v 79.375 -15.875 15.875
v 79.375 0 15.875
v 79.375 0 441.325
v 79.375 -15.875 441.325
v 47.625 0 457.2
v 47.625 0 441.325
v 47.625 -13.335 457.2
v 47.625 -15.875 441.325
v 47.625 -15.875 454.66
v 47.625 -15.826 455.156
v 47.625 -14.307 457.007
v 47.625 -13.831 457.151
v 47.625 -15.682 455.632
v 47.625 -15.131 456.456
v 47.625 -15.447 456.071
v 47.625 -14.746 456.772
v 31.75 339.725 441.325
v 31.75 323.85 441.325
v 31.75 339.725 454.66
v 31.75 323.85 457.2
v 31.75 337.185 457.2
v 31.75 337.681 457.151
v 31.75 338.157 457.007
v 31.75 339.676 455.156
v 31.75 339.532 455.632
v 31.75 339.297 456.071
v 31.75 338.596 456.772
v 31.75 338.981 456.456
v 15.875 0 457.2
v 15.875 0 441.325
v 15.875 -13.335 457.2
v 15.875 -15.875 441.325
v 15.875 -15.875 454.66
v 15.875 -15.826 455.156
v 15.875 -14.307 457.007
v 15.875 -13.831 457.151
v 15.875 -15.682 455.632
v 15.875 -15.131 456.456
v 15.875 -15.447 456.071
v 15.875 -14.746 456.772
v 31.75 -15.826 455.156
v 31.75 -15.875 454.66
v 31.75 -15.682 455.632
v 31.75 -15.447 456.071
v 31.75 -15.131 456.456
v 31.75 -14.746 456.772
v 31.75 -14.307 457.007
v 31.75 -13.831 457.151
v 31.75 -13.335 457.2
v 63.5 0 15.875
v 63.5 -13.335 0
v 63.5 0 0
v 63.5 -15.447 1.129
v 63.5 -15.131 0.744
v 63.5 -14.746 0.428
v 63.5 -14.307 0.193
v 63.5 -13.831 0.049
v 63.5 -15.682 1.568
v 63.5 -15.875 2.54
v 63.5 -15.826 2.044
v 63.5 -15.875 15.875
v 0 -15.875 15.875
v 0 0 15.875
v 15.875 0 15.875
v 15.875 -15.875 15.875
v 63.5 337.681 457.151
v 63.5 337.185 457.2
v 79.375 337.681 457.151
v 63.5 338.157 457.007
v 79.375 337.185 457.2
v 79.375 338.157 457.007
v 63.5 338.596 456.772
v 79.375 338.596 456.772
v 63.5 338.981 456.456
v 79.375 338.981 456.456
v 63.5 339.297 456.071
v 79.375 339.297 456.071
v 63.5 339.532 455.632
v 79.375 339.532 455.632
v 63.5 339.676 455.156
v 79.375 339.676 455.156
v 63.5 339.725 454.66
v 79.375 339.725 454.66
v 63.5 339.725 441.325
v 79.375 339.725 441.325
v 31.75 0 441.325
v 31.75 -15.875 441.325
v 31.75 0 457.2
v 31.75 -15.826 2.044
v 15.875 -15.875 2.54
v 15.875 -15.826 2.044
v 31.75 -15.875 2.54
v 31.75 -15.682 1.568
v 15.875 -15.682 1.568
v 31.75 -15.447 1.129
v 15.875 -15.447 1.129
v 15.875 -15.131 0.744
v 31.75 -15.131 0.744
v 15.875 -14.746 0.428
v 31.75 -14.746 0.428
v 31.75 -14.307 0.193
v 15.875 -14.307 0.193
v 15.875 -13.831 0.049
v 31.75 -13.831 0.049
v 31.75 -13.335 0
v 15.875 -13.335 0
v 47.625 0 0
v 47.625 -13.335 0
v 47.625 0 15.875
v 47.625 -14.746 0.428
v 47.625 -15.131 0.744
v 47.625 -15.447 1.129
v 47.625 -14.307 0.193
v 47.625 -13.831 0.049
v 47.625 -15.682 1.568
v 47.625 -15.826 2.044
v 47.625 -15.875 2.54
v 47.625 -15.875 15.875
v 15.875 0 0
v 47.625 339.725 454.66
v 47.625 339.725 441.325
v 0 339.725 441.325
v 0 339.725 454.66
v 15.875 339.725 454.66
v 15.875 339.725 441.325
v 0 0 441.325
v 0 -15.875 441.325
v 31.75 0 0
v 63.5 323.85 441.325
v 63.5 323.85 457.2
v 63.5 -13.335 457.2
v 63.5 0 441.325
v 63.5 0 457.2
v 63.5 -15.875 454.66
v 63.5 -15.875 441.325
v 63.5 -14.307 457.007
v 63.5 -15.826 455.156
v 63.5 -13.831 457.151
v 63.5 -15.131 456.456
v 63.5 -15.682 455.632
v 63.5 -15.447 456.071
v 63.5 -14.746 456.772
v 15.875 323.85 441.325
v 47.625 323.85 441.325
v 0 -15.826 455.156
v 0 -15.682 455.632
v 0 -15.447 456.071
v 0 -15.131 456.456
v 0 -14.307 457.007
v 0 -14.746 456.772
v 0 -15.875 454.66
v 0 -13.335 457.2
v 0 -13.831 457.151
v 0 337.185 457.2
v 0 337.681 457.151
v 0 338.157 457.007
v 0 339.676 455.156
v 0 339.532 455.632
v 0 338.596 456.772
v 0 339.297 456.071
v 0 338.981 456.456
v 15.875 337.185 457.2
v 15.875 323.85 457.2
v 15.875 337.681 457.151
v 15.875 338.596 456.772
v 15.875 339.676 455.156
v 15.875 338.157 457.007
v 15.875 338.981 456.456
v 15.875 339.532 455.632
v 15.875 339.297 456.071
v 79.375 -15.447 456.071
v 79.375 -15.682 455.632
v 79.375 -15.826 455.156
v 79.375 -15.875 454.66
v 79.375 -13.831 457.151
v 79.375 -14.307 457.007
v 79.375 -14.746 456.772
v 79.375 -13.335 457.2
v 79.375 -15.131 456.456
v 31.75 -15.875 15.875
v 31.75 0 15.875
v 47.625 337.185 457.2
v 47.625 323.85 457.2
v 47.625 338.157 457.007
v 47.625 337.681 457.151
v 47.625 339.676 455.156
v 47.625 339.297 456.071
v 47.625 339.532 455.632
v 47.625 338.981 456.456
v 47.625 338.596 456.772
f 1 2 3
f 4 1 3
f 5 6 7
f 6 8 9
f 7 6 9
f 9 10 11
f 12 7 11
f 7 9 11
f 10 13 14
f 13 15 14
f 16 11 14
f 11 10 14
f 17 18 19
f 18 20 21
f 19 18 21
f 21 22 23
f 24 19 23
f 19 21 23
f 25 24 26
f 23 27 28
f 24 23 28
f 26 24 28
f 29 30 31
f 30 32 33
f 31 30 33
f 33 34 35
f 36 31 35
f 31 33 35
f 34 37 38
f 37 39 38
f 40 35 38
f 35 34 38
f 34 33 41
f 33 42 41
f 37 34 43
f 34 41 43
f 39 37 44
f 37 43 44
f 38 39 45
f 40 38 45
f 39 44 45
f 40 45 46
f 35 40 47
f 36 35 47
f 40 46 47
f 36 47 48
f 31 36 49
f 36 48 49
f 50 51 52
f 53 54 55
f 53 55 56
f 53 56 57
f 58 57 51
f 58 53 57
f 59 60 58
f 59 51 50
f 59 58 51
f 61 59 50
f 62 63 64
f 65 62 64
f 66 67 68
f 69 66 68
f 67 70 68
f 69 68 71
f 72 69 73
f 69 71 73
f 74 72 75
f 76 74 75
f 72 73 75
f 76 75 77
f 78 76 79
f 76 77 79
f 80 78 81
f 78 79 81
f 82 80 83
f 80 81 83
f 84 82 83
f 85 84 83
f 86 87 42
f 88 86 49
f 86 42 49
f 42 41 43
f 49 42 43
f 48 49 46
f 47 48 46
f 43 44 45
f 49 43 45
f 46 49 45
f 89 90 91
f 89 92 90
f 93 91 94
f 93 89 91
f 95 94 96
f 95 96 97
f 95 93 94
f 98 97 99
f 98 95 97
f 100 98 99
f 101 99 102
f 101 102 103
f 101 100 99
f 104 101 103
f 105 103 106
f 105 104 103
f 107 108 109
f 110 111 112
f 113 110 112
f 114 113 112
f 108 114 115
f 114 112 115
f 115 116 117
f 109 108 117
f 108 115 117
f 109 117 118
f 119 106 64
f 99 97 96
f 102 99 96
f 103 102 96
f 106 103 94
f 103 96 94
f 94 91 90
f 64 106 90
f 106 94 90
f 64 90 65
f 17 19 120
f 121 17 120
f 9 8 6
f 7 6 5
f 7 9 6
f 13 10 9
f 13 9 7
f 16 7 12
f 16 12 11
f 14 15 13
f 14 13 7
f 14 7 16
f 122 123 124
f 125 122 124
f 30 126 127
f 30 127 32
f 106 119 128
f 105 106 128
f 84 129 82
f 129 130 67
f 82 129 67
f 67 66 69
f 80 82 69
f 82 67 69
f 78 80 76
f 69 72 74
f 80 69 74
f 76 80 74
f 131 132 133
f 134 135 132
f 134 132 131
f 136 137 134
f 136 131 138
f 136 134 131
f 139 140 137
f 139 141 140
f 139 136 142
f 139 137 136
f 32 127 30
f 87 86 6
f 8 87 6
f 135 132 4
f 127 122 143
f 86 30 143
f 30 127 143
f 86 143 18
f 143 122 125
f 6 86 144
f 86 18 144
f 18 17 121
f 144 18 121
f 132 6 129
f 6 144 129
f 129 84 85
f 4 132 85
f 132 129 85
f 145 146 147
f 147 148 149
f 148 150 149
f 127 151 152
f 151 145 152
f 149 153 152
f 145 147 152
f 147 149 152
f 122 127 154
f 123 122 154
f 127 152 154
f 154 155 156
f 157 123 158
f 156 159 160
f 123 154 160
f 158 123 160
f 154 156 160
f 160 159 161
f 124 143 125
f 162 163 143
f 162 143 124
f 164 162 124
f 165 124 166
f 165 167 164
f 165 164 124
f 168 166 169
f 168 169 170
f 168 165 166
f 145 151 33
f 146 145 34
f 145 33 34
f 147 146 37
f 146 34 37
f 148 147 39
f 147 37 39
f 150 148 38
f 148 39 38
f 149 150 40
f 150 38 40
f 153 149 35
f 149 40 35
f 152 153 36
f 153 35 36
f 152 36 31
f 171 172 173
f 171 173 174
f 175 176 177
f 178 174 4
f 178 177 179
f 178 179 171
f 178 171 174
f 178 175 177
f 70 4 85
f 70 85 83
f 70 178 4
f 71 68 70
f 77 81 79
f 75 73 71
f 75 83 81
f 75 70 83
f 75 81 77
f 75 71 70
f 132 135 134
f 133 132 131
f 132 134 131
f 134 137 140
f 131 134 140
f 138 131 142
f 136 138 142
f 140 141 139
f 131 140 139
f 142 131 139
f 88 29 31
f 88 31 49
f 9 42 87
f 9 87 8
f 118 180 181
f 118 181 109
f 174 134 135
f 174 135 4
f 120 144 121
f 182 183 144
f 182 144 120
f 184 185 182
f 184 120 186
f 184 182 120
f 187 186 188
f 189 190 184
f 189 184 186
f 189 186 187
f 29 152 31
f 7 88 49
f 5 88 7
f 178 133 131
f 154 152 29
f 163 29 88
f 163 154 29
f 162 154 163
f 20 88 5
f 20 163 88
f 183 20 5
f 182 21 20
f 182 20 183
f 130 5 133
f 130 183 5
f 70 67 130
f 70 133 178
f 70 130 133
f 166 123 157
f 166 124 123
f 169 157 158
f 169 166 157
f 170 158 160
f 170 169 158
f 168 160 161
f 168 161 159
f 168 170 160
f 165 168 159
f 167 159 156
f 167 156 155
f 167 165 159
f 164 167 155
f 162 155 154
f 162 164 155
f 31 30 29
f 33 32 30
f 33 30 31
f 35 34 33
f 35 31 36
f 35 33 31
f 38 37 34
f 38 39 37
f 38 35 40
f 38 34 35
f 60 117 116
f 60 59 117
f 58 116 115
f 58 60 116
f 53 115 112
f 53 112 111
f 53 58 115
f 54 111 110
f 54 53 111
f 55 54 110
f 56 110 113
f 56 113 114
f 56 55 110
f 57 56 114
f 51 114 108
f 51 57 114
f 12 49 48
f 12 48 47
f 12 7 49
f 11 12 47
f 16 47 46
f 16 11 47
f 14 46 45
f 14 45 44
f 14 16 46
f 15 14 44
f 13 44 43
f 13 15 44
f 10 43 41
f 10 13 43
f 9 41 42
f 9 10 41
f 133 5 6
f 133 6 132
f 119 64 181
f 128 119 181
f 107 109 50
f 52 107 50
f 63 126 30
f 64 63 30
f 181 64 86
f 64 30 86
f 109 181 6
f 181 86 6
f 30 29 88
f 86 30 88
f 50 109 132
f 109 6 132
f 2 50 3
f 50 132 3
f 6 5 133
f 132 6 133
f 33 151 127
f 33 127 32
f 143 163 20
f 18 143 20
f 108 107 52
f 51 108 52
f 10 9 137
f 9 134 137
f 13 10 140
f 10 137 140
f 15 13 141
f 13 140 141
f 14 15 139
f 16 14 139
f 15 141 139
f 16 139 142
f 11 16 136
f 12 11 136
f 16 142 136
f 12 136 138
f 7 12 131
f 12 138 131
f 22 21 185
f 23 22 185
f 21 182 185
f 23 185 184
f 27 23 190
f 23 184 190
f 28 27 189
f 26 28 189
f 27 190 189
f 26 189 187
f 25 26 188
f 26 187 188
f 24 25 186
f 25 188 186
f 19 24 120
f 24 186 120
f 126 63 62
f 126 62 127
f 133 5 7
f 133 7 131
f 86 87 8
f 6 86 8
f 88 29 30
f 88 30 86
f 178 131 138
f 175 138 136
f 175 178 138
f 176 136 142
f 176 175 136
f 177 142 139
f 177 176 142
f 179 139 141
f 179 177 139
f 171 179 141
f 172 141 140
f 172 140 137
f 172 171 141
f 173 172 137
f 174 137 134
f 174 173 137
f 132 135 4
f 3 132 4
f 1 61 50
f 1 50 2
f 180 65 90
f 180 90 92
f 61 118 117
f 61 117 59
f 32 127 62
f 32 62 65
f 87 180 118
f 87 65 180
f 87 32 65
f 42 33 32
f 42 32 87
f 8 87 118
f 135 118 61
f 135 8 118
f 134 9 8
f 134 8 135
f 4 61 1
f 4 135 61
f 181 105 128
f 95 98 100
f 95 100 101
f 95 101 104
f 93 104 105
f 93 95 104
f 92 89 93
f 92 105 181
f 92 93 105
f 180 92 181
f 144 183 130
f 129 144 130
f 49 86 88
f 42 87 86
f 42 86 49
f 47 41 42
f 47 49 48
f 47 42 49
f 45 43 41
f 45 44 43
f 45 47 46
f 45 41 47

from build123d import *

# Parameters (mm, degrees)
F0_W     = 79.375
F0_H     = 457.2
F1_DEPTH = 15.875
F2_W     = 15.875
F2_H     = 15.875
F3_DEPTH = 15.875
F4_W     = 79.375
F4_H     = 355.6
F5_DEPTH = 15.875
F8_W     = 15.875
F8_H     = 15.875
F9_DEPTH = 15.875
F10_R    = 2.54
F10_2_R  = 2.54


with BuildPart() as f1:
    # F0 (on Front) → F1 (new body)
    with BuildSketch(Plane.XZ):
        with Locations((39.6875, 228.6)):
            Rectangle(F0_W, F0_H)
    extrude(amount=F1_DEPTH)

    # F2 (on face) → F3 (cut, through all)
    with BuildSketch(Plane.XZ.offset(15.875)):
        with Locations((7.9375, 449.2625)):
            Rectangle(F2_W, F2_H)
        with Locations((7.9375, 7.9375)):
            Rectangle(F2_W, F2_H)
        with Locations((39.6875, 449.2625)):
            Rectangle(F2_W, F2_H)
        with Locations((39.6875, 7.9375)):
            Rectangle(F2_W, F2_H)
        with Locations((71.4375, 449.2625)):
            Rectangle(F2_W, F2_H)
        with Locations((71.4375, 7.9375)):
            Rectangle(F2_W, F2_H)
    extrude(amount=-F3_DEPTH, mode=Mode.SUBTRACT)


with BuildPart() as f5:
    # F4 (on face) → F5 (new body)
    with BuildSketch(Plane.XY.offset(457.2)):
        with Locations((39.6875, 161.925)):
            Rectangle(F4_W, F4_H)
    extrude(amount=-F5_DEPTH)

    # F6: cut F1
    add(f1.part, mode=Mode.SUBTRACT)

    # F8 (on face) → F9 (cut, through all)
    with BuildSketch(Plane.XY.offset(457.2)):
        with Locations((23.8125, 331.7875)):
            Rectangle(F8_W, F8_H)
        with Locations((55.5625, 331.7875)):
            Rectangle(F8_W, F8_H)
    extrude(amount=-F9_DEPTH, mode=Mode.SUBTRACT)

    # F10
    f10_edges = [f5.edges().sort_by_distance(p)[0] for p in [
        (71.4375, -15.875, 457.2),
        (39.6875, -15.875, 457.2),
        (7.9375, -15.875, 457.2),
        (71.4375, 339.725, 457.2),
        (39.6875, 339.725, 457.2),
        (7.9375, 339.725, 457.2),
    ]]
    fillet(f10_edges, radius=F10_R)


with BuildPart() as f1_1:
    add(f1.part)

    # F10#2
    f10_2_edges = [f1_1.edges().sort_by_distance(p)[0] for p in [
        (55.5625, -15.875, 457.2),
        (23.8125, -15.875, 457.2),
        (23.8125, -15.875, 0),
        (55.5625, -15.875, 0),
    ]]
    fillet(f10_2_edges, radius=F10_2_R)


solid = Compound([f5.part, f1_1.part])
